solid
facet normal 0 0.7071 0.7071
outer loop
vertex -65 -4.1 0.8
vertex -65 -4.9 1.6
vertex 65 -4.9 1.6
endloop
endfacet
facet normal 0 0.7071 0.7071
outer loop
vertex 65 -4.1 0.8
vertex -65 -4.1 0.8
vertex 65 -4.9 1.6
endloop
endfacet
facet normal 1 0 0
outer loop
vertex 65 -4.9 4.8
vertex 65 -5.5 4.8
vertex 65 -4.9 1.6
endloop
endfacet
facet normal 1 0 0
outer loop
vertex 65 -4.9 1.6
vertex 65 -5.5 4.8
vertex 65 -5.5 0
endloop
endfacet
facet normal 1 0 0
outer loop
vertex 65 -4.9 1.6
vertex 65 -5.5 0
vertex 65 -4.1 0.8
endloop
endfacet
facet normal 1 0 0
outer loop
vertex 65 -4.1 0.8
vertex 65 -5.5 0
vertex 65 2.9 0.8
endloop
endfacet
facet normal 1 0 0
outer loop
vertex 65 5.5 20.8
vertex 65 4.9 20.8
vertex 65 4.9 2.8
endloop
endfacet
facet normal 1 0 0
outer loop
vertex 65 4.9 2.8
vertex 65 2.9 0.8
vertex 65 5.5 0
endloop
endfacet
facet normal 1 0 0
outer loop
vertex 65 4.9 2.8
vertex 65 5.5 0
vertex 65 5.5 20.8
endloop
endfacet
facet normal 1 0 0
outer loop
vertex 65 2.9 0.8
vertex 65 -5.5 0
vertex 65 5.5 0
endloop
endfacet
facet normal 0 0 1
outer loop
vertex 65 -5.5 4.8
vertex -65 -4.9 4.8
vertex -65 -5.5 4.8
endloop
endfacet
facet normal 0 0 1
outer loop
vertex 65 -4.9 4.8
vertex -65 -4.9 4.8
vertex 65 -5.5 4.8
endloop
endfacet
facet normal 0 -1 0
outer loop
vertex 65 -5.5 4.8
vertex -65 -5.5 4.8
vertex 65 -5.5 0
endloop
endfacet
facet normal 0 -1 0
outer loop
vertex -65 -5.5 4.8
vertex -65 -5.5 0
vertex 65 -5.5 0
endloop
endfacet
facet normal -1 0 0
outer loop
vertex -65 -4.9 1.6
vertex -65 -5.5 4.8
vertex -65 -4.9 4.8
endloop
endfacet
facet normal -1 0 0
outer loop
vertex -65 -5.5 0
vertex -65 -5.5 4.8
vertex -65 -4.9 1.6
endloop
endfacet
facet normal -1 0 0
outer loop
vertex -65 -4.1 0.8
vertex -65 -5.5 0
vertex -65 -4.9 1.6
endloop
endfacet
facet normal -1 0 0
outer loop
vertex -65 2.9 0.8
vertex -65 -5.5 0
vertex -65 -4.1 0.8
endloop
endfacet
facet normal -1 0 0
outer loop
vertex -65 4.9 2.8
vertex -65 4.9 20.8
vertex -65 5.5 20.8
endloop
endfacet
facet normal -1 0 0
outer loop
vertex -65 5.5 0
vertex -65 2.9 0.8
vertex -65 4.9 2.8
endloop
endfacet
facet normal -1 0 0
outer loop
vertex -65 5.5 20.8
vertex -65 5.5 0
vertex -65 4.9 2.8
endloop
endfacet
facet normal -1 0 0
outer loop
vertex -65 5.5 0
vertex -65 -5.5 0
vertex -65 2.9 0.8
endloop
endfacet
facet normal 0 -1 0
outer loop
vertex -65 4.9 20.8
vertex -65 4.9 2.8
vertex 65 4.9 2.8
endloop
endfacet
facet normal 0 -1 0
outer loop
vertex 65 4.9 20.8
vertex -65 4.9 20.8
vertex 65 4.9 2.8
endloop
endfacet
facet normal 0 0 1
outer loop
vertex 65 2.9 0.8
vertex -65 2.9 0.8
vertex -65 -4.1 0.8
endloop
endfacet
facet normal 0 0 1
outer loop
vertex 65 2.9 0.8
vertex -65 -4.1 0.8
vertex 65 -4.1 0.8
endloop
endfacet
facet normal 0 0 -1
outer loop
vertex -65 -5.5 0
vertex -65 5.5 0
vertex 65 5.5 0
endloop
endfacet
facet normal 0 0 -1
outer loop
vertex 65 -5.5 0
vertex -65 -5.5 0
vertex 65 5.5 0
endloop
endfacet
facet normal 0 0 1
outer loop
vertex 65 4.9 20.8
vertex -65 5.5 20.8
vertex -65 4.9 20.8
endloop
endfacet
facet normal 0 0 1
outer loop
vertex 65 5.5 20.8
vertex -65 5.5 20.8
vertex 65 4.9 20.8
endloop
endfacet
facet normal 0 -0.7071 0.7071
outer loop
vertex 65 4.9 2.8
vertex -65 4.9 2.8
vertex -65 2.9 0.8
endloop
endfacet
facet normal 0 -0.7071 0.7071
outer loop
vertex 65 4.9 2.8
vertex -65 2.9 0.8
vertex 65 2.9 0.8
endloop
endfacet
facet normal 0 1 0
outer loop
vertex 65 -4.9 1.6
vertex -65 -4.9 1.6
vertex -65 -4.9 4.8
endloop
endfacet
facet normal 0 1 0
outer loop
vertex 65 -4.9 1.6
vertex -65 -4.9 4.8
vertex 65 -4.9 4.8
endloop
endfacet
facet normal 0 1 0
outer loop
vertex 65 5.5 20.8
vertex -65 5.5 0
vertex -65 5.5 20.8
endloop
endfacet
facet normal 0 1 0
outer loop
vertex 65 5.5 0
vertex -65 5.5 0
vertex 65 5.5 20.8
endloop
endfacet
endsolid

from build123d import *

# Parameters (mm, degrees)
SKETCH_1_W      = 130
SKETCH_1_H      = 11
EXTRUDE_1_DEPTH = 0.8
SKETCH_2_W      = 130
SKETCH_2_H      = 0.6
EXTRUDE_2_DEPTH = 20
SKETCH_3_W      = 130
SKETCH_3_H      = 2
EXTRUDE_3_DEPTH = 2
CHAMFER_1_SIZE  = 2
SKETCH_4_W      = 130
SKETCH_4_H      = 0.6
EXTRUDE_4_DEPTH = 4
SKETCH_5_W      = 130
SKETCH_5_H      = 0.8
EXTRUDE_5_DEPTH = 0.8
CHAMFER_2_SIZE  = 0.8


with BuildPart() as part:
    # 草图1 → 凸台-拉伸1 (new body)
    with BuildSketch(Plane.XY):
        Rectangle(SKETCH_1_W, SKETCH_1_H)
    extrude(amount=EXTRUDE_1_DEPTH)

    # 草图2 → 凸台-拉伸2 (add)
    with BuildSketch(Plane.XY.offset(0.8)):
        with Locations((0, 5.2)):
            Rectangle(SKETCH_2_W, SKETCH_2_H)
    extrude(amount=EXTRUDE_2_DEPTH)

    # 草图3 → 凸台-拉伸3 (add)
    with BuildSketch(Plane.XY.offset(0.8)):
        with Locations((0, 3.9)):
            Rectangle(SKETCH_3_W, SKETCH_3_H)
    extrude(amount=EXTRUDE_3_DEPTH)

    # 倒角1
    chamfer_1_edges = [part.edges().sort_by_distance(p)[0] for p in [
        (0, 2.9, 2.8),
    ]]
    chamfer(chamfer_1_edges, length=CHAMFER_1_SIZE - 0.0001)  # a hair under: the kernel refuses the full size

    # 草图4 → 凸台-拉伸4 (add)
    with BuildSketch(Plane.XY.offset(0.8)):
        with Locations((0, -5.2)):
            Rectangle(SKETCH_4_W, SKETCH_4_H)
    extrude(amount=EXTRUDE_4_DEPTH)

    # 草图5 → 凸台-拉伸5 (add)
    with BuildSketch(Plane.XY.offset(0.8)):
        with Locations((0, -4.5)):
            Rectangle(SKETCH_5_W, SKETCH_5_H)
    extrude(amount=EXTRUDE_5_DEPTH)

    # 倒角2
    chamfer_2_edges = [part.edges().sort_by_distance(p)[0] for p in [
        (0, -4.1, 1.6),
    ]]
    chamfer(chamfer_2_edges, length=CHAMFER_2_SIZE - 0.0001)  # a hair under: the kernel refuses the full size


solid = part.part
